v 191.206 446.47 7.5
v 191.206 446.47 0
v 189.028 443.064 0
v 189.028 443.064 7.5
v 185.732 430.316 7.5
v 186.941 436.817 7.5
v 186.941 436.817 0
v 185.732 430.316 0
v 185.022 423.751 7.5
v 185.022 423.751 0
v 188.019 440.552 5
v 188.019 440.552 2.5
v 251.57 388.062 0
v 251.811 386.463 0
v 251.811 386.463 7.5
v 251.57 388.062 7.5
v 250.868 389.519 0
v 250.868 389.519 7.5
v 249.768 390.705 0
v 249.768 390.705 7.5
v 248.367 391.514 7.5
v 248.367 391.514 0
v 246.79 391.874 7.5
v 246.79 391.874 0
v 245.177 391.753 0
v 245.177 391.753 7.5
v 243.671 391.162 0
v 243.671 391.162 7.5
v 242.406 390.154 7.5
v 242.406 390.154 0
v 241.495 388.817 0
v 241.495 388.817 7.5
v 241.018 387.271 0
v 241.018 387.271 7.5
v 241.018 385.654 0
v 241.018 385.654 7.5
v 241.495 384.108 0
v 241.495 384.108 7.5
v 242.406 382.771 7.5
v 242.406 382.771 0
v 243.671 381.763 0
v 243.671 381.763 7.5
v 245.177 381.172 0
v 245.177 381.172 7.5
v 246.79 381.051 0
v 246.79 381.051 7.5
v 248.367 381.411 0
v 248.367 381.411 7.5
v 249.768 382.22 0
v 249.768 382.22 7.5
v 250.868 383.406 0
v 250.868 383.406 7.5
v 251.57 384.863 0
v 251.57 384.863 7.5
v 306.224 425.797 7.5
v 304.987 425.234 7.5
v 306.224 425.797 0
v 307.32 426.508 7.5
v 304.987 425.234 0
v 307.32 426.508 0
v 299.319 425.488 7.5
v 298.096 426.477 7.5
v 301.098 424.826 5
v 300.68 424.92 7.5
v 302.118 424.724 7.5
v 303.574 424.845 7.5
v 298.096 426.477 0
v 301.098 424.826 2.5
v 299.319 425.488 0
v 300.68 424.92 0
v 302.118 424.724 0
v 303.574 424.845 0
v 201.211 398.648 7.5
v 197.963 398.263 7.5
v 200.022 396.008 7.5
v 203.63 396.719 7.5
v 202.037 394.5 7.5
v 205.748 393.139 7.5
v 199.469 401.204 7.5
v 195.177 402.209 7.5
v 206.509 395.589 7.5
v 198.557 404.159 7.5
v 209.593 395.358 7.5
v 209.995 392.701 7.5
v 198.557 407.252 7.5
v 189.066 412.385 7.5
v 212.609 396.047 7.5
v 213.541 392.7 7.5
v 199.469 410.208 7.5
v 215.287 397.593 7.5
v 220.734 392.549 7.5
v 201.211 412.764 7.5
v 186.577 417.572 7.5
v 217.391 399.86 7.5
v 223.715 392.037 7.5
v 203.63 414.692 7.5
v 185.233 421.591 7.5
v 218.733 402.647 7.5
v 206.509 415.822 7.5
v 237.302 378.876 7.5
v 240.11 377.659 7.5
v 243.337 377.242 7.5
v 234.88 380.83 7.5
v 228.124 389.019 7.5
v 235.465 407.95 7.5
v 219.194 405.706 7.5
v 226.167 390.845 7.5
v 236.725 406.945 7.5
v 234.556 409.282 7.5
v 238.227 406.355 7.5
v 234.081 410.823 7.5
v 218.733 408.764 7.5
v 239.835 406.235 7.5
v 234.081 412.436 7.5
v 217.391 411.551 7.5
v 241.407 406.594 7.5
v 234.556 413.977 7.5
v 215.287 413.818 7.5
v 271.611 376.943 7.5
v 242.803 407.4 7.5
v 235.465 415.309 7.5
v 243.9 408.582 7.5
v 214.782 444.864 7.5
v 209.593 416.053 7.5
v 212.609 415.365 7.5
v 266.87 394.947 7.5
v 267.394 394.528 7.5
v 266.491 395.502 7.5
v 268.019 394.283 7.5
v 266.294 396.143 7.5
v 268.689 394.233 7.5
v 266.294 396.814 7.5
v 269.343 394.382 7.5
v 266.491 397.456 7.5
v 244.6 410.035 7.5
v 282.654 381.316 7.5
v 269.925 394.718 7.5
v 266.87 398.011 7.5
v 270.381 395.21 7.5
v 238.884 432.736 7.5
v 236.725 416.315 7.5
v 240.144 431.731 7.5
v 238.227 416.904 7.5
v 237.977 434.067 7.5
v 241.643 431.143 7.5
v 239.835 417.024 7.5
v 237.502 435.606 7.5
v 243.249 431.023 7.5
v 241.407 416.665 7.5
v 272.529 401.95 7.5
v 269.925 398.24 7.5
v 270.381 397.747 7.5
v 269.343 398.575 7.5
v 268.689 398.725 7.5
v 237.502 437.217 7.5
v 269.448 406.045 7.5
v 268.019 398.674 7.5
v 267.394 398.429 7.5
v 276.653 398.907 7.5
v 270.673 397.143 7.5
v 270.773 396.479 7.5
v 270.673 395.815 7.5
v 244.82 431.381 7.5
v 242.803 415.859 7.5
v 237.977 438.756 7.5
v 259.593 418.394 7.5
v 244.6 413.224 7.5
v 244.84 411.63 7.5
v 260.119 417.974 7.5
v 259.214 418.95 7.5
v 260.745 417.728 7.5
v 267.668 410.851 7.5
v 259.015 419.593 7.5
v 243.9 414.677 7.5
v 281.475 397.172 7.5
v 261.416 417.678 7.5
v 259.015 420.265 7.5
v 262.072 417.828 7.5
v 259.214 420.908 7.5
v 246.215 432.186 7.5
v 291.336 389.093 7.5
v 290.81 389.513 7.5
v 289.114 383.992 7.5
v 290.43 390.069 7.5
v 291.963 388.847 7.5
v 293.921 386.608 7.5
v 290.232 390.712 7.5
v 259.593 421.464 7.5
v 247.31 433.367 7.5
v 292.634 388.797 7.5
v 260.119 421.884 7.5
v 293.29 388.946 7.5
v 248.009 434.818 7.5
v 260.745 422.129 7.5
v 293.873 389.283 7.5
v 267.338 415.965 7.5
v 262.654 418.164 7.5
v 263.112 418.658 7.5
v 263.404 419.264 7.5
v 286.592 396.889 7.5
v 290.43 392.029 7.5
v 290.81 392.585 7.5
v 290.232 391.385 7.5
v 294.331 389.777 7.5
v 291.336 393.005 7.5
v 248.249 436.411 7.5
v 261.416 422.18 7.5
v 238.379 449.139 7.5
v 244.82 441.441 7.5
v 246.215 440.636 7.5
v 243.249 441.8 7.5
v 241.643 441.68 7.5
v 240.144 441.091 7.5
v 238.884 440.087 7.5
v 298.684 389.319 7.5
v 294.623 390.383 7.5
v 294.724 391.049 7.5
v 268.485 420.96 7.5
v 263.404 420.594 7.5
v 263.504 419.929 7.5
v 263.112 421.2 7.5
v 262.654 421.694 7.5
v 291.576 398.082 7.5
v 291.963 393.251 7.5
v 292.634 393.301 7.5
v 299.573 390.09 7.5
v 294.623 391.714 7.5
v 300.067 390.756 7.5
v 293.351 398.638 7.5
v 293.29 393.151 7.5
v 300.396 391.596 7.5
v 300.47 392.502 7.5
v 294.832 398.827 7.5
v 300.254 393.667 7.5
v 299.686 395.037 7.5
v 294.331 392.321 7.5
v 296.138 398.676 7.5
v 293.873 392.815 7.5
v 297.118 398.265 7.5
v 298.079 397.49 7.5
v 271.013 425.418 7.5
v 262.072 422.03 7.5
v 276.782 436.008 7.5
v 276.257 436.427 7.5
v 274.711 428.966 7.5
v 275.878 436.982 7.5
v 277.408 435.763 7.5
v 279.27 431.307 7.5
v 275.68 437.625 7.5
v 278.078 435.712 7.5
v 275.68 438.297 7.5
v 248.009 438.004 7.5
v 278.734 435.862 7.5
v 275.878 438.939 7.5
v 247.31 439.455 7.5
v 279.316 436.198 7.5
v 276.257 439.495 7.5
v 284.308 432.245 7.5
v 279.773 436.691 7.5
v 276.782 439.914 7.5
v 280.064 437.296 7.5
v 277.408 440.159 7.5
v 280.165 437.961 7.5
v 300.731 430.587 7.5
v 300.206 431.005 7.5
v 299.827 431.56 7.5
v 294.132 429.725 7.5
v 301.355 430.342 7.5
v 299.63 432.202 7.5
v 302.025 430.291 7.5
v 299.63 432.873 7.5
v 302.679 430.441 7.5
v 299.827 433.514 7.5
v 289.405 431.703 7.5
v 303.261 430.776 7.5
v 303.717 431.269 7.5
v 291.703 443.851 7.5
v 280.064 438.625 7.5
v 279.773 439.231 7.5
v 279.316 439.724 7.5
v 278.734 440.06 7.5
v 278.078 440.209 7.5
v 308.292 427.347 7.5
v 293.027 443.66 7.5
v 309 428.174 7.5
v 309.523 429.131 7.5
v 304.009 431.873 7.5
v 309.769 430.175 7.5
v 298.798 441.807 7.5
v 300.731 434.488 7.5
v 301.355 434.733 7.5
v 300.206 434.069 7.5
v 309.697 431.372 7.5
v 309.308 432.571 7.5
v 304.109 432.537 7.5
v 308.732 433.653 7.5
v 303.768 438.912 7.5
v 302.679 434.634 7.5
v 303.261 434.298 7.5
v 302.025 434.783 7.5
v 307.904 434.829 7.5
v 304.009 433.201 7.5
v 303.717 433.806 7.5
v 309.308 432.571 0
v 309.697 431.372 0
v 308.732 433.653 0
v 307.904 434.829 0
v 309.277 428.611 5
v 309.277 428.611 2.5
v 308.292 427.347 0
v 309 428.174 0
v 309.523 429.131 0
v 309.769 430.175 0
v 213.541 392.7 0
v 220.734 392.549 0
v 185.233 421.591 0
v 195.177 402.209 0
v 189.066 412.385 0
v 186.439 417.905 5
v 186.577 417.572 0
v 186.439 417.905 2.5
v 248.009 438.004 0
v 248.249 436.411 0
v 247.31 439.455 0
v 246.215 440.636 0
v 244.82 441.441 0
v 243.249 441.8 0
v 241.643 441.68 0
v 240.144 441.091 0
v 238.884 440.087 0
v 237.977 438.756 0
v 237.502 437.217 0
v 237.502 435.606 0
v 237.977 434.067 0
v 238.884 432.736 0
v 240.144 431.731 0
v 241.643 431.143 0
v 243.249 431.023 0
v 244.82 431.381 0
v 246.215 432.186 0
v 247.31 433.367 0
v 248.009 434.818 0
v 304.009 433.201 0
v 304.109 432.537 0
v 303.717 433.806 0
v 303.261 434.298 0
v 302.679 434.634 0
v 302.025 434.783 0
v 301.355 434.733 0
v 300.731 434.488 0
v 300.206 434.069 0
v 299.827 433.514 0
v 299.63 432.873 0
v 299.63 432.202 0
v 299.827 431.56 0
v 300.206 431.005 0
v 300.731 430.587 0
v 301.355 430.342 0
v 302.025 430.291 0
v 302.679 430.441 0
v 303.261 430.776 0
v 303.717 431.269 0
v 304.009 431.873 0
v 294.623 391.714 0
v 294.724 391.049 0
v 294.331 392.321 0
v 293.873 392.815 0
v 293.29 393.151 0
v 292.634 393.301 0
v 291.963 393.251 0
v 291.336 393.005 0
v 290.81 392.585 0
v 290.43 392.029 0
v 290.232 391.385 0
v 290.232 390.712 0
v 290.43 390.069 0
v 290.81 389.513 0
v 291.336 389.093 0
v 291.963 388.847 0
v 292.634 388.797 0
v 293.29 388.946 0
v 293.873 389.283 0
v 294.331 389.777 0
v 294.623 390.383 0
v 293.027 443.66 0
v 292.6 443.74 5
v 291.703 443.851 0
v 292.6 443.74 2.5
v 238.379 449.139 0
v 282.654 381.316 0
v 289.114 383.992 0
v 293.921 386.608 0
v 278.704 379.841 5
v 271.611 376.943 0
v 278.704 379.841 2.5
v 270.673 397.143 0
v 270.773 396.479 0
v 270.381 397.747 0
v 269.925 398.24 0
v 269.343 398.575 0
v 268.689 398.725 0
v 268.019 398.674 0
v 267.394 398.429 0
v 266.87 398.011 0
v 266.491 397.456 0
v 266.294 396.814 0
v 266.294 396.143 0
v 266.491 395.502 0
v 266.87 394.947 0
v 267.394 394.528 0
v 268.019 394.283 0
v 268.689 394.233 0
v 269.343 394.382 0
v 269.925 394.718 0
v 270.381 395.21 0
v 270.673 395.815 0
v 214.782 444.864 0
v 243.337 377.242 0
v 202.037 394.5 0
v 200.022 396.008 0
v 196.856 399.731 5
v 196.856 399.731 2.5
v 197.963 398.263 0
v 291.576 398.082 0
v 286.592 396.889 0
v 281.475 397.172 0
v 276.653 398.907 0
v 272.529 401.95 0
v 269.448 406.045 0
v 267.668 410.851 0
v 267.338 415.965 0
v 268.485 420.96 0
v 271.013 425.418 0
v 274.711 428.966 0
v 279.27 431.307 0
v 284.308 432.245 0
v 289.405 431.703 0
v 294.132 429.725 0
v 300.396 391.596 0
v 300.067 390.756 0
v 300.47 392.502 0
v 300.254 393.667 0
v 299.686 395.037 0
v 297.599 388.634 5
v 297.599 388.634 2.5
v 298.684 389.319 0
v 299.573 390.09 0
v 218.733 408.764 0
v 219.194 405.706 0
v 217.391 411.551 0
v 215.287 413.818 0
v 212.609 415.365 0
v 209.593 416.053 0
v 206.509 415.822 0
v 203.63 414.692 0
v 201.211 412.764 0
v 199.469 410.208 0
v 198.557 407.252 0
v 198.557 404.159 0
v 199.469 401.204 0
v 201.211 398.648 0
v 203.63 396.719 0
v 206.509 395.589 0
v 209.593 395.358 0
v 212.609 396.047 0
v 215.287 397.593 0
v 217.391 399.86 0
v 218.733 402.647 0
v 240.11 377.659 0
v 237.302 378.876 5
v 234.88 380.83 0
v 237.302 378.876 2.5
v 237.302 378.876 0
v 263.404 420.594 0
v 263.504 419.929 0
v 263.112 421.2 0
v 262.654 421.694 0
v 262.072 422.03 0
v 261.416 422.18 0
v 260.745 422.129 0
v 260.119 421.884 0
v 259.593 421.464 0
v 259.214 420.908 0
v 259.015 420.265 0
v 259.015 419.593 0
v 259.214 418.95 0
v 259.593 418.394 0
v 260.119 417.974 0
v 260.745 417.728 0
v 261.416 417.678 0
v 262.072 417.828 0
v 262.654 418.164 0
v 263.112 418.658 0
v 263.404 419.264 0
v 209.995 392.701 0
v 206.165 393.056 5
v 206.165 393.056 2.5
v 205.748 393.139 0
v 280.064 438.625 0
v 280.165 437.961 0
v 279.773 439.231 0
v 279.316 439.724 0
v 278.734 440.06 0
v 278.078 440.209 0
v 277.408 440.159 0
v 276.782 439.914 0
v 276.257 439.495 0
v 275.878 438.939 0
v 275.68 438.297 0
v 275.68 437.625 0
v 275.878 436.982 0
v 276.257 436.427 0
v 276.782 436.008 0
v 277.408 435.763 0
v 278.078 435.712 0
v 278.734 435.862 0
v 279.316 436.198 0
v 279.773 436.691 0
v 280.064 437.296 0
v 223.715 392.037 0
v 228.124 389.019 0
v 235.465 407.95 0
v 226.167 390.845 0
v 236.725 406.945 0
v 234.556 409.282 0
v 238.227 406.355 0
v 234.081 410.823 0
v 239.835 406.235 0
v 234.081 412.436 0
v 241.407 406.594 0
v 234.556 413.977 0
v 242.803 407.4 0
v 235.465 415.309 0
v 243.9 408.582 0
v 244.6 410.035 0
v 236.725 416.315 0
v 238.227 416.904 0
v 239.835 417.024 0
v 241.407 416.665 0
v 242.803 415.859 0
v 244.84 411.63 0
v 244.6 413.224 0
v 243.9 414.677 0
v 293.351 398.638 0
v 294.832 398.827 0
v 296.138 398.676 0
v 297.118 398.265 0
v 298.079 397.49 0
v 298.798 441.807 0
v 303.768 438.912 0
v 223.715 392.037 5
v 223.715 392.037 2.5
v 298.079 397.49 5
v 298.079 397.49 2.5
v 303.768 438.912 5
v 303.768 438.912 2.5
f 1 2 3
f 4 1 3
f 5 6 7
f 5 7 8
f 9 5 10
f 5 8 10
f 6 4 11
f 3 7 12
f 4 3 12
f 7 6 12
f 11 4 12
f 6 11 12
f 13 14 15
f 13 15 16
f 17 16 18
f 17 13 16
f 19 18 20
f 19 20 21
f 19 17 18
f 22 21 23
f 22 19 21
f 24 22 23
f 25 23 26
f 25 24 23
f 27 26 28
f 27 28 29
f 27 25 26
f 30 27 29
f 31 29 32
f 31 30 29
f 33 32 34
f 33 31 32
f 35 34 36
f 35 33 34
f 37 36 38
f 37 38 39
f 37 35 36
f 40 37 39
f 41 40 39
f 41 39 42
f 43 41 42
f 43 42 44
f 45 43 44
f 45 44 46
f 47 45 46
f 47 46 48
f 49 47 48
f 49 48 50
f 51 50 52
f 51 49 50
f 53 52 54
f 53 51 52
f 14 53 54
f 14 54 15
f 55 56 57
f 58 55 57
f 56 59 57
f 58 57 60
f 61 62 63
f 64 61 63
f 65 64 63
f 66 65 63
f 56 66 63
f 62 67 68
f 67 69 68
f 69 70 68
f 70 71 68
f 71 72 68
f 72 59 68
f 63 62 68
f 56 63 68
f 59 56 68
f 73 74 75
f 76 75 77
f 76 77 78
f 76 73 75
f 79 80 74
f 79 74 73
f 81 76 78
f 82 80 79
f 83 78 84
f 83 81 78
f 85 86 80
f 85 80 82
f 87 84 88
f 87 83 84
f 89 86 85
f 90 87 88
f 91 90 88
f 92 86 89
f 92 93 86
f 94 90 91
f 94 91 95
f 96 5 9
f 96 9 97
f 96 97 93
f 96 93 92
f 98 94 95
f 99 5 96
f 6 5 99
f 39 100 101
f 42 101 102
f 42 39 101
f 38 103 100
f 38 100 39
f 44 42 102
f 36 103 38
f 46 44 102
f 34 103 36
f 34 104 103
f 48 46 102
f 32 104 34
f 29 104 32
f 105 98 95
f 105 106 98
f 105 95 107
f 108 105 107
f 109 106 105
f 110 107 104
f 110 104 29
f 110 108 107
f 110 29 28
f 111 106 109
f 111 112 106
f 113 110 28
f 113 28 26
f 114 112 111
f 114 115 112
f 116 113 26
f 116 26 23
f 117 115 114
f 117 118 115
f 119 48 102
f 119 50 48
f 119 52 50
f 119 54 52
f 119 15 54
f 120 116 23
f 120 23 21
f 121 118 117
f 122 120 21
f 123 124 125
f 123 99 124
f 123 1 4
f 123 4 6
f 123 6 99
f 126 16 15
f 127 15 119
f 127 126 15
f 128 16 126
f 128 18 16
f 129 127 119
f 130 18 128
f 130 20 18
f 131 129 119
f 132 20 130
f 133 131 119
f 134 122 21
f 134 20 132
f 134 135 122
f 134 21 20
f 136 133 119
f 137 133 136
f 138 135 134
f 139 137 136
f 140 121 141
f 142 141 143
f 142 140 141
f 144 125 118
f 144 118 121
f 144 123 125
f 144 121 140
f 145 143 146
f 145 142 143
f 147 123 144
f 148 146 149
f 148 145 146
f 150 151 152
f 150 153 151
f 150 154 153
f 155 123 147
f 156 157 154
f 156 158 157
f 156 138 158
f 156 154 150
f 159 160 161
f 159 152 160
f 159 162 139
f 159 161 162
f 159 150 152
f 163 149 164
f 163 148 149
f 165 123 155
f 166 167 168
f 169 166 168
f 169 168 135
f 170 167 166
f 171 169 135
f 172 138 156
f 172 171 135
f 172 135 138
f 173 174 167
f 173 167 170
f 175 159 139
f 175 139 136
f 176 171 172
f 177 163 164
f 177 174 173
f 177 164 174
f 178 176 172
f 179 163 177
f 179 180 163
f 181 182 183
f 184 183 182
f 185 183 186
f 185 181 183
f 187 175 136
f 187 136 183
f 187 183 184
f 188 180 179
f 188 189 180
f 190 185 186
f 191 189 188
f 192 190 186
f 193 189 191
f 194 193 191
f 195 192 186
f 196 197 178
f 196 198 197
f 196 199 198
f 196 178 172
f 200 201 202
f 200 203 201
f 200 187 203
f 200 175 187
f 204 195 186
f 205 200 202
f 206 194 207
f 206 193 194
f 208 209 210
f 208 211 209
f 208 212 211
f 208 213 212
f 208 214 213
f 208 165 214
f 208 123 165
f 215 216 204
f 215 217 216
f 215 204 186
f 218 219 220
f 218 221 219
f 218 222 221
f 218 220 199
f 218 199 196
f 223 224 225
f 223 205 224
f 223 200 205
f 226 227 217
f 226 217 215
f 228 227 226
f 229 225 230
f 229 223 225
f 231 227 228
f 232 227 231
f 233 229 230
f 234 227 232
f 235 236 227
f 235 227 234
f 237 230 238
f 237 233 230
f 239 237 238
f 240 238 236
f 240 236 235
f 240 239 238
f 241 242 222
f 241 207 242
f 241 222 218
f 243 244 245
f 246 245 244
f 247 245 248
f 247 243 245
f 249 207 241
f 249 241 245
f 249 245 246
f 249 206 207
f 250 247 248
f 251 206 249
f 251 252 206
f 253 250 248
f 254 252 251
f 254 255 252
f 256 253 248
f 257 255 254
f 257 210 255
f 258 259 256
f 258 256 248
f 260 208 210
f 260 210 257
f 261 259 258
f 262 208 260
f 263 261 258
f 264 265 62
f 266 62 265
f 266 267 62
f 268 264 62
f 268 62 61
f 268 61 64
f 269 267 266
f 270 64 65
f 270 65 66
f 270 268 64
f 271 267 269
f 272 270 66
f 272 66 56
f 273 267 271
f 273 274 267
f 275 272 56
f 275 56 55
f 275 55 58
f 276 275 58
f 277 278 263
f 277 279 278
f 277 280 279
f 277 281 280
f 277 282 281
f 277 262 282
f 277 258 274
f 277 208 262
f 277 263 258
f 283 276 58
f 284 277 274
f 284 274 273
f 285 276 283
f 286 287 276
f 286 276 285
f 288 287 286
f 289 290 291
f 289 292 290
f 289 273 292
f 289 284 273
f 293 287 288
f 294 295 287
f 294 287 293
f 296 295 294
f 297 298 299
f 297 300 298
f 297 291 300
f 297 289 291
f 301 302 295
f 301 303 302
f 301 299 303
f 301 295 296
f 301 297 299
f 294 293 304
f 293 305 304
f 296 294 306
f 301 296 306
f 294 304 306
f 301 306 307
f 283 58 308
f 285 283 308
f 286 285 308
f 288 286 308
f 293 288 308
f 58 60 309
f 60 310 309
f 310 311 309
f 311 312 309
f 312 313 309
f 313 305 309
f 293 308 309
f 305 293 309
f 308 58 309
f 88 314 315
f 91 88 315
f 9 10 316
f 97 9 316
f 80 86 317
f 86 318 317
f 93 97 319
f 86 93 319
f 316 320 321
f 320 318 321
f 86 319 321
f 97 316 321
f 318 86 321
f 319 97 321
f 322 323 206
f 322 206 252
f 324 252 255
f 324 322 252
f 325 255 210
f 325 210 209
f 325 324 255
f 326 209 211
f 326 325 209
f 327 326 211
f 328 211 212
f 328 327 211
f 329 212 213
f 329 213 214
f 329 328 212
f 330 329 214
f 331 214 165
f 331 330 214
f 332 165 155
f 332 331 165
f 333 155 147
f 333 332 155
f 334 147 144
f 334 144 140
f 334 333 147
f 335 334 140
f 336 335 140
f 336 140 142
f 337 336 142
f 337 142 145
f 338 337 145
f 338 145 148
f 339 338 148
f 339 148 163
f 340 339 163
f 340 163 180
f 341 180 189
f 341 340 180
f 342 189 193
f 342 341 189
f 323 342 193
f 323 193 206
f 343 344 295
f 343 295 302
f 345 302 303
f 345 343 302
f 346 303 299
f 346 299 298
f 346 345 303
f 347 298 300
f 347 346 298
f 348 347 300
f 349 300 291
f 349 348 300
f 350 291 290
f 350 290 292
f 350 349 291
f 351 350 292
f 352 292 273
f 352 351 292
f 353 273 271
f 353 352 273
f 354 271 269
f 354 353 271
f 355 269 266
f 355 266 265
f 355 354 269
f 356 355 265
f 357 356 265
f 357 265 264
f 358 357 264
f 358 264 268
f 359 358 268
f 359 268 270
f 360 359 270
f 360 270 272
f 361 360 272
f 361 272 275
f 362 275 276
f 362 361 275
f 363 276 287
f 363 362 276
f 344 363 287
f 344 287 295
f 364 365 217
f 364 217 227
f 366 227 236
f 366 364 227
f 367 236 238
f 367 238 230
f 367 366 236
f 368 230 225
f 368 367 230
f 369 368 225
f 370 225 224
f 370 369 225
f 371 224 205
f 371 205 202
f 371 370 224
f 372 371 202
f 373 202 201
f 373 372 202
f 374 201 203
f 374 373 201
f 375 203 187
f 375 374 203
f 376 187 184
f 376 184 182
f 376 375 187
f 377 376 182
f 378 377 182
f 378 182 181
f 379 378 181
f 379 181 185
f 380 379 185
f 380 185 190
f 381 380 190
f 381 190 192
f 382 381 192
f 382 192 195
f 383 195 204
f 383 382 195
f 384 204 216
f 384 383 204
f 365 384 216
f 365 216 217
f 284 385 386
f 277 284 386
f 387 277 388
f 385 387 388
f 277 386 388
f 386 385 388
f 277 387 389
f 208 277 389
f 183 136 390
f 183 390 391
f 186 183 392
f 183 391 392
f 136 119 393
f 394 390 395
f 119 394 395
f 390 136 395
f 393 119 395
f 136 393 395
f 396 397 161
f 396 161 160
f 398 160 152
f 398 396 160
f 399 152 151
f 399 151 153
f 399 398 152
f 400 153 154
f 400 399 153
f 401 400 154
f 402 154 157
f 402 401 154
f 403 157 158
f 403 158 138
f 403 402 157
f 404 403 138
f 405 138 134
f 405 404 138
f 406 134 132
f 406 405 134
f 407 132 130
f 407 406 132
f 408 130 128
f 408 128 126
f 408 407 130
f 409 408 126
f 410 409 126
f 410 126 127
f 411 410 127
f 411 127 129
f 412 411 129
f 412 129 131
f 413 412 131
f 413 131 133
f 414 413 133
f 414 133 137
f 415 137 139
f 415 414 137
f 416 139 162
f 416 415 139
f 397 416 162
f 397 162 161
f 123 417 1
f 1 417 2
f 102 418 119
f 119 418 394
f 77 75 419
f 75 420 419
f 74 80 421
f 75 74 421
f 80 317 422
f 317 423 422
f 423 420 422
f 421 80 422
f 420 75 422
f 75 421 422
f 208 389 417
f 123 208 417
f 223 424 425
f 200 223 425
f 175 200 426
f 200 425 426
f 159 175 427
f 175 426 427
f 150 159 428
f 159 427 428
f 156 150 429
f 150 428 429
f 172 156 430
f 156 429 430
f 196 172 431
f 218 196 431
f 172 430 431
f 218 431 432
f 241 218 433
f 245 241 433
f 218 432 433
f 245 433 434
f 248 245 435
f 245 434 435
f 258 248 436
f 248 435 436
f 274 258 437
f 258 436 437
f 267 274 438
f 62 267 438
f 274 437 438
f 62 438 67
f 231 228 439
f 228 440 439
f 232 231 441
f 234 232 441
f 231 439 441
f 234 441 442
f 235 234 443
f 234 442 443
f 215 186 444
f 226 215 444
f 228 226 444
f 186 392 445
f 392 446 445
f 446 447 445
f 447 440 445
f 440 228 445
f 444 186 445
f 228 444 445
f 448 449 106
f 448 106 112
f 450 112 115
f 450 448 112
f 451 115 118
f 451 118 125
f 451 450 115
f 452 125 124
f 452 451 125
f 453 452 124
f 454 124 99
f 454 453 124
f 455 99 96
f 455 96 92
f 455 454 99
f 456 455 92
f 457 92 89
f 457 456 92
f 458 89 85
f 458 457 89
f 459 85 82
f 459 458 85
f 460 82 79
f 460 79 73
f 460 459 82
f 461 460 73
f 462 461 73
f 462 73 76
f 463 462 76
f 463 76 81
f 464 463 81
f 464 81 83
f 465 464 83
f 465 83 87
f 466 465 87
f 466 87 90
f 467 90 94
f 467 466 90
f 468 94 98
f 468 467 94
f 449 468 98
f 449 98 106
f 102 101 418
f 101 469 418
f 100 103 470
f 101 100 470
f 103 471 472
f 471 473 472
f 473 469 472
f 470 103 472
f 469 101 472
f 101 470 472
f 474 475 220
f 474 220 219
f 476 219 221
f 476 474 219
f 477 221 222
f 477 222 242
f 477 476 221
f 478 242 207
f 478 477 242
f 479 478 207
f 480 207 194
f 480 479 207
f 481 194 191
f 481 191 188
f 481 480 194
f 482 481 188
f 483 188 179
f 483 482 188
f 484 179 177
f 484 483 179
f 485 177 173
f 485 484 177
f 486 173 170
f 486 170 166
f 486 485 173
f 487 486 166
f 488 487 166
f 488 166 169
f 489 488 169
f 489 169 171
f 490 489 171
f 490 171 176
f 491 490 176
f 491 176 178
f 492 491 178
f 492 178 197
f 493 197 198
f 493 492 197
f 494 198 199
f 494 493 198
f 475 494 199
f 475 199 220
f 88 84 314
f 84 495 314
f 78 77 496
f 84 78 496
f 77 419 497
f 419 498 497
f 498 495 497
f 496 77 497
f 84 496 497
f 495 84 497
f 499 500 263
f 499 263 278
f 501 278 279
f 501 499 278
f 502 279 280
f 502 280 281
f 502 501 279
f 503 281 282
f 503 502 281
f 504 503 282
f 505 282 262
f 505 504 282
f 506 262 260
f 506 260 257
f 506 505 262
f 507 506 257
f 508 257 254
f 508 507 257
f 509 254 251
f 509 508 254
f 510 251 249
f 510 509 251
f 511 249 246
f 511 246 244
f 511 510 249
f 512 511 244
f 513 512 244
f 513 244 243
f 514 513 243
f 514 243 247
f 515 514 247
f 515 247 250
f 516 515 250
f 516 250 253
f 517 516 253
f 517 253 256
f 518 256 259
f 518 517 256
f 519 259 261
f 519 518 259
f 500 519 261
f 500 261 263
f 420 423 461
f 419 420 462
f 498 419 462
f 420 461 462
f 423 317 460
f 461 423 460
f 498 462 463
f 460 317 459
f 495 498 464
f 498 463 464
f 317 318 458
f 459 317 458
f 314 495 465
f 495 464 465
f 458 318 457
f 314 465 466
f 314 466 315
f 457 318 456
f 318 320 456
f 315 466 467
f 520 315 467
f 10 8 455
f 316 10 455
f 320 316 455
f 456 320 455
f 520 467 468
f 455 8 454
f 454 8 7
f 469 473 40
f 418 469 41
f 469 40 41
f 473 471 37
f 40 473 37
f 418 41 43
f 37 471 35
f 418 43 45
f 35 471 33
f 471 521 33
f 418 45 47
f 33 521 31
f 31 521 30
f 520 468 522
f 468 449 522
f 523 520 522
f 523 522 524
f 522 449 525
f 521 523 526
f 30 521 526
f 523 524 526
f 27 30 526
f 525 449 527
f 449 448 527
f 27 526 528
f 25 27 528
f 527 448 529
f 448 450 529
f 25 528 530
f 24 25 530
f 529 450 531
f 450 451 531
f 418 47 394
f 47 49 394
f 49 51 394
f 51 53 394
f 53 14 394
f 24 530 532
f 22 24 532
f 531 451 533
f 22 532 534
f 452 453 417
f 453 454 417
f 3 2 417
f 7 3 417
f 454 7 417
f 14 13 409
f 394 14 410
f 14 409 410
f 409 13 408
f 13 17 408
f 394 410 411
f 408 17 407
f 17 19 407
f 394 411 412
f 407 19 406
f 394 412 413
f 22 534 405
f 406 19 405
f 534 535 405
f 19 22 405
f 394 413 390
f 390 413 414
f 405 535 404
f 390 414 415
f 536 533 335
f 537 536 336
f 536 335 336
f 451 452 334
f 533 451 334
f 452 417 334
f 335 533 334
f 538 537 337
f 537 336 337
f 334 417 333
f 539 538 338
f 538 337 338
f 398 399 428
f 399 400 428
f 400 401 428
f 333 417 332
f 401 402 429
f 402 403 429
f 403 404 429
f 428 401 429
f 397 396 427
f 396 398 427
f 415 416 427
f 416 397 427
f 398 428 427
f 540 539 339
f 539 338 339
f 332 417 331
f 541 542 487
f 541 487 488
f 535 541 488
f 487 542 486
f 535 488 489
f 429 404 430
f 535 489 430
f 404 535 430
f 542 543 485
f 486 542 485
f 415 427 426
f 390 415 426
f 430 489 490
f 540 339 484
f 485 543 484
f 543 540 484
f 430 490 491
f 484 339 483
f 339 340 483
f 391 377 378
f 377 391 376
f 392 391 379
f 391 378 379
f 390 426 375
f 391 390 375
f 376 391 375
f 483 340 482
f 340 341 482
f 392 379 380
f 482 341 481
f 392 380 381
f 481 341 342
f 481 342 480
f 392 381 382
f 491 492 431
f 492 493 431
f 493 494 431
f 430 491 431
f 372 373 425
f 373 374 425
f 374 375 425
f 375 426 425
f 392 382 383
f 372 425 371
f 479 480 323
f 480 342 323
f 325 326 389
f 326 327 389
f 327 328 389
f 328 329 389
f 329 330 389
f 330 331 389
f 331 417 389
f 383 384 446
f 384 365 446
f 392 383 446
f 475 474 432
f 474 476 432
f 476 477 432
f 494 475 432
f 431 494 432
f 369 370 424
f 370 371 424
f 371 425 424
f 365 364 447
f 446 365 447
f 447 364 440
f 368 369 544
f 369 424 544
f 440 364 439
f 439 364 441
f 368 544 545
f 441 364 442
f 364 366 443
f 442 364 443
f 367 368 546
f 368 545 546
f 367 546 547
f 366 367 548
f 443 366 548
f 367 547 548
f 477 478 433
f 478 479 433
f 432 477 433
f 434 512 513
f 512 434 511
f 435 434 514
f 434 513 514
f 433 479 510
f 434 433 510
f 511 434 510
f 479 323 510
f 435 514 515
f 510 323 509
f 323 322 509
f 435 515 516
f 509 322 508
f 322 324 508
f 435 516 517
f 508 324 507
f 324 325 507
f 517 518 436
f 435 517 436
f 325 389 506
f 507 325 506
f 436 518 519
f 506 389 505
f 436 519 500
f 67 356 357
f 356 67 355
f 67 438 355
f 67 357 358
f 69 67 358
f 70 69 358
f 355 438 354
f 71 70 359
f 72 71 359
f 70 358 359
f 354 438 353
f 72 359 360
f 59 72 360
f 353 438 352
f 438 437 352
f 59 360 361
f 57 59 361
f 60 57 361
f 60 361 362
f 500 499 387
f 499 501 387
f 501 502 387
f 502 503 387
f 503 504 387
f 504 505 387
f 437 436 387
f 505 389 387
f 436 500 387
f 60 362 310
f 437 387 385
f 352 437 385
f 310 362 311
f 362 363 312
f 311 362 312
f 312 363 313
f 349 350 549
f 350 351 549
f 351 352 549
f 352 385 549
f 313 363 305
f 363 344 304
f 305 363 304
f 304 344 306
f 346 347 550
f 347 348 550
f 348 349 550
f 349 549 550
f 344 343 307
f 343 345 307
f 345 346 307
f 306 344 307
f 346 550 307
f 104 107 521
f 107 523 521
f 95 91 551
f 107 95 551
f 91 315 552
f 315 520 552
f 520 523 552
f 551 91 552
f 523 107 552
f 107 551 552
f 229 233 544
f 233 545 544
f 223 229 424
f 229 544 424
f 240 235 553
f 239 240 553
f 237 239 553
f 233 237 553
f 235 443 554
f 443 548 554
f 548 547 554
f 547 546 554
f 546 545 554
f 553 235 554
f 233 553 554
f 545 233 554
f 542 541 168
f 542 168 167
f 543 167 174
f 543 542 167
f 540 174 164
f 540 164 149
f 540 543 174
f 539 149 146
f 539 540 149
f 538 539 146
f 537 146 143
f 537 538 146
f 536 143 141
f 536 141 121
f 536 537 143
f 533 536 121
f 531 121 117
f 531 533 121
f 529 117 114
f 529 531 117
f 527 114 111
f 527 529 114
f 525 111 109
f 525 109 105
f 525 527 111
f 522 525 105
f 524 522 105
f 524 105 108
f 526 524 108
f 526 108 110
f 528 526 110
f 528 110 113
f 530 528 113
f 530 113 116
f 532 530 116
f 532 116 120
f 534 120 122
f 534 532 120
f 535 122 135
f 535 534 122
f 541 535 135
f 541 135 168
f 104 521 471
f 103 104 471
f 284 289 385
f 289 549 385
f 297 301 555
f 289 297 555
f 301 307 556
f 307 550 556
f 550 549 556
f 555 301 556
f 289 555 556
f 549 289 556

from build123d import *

# Parameters (mm, degrees)
SKETCH1_R           = 13.83528528
SKETCH1_R_2         = 7.235591107
SKETCH1_R_3         = 3.011320737
SKETCH1_R_4         = 7.213103978
SKETCH1_R_5         = 3.002883417
SKETCH1_R_6         = 3.009410698
SKETCH1_R_7         = 7.205059389
SKETCH1_R_8         = 3.006464833
SKETCH1_R_9         = 3.002887994
BOSS_EXTRUDE3_DEPTH = 10
SCALE6_SCALE        = 0.75


with BuildPart() as part:
    # Sketch1 → Boss-Extrude3 (new body)
    with BuildSketch(Plane.XY):
        with BuildLine():
            add(Edge.make_bspline(
                [(390.702437401, 591.546424948), (390.170237401, 591.665524948), (389.498937401, 591.746824948), (388.937137401, 591.801924948)],
                knots=[0.166666667, 0.166666667, 0.166666667, 0.166666667, 0.208333333, 0.208333333, 0.208333333, 0.208333333], degree=3))
            Line((388.937137401, 591.801924948), (317.8384, 598.8518))
            Line((317.8384, 598.8518), (286.3759, 593.1514))
            Line((286.3759, 593.1514), (254.9413, 595.2929))
            add(Edge.make_bspline(
                [(254.9413, 595.2929), (249.749, 589.6403), (247.5763, 576.1381), (246.6964, 565.0014)],
                knots=[0.333333333, 0.333333333, 0.333333333, 0.333333333, 0.375, 0.375, 0.375, 0.375], degree=3))
            add(Edge.make_bspline(
                [(246.6964, 565.0014), (246.2536, 559.3969), (253.8266, 545.9237), (260.2361, 536.2788)],
                knots=[0.375, 0.375, 0.375, 0.375, 0.416666667, 0.416666667, 0.416666667, 0.416666667], degree=3))
            add(Edge.make_bspline(
                [(260.2361, 536.2788), (261.9315, 533.7276), (265.3965, 528.2241), (269.3831, 526.0001)],
                knots=[0.416666667, 0.416666667, 0.416666667, 0.416666667, 0.458333333, 0.458333333, 0.458333333, 0.458333333], degree=3))
            add(Edge.make_bspline(
                [(269.3831, 526.0001), (274.7125, 523.027), (280.9349, 523.6791), (284.7215, 523.5997)],
                knots=[0.458333333, 0.458333333, 0.458333333, 0.458333333, 0.5, 0.5, 0.5, 0.5], degree=3))
            Line((284.7215, 523.5997), (294.3118, 523.3986))
            add(Edge.make_bspline(
                [(294.3118, 523.3986), (298.656, 523.1896), (301.8697, 521.53), (304.1649, 518.6915)],
                knots=[0.541666667, 0.541666667, 0.541666667, 0.541666667, 0.583333333, 0.583333333, 0.583333333, 0.583333333], degree=3))
            Line((304.1649, 518.6915), (313.1736, 507.7735))
            add(Edge.make_bspline(
                [(313.1736, 507.7735), (316.1604, 504.7059), (319.8516, 502.9821), (324.4499, 502.9891)],
                knots=[0.625, 0.625, 0.625, 0.625, 0.666666667, 0.666666667, 0.666666667, 0.666666667], degree=3))
            Line((324.4499, 502.9891), (362.1482, 502.591))
            add(Edge.make_bspline(
                [(362.1482, 502.591), (370.3987, 506.5747), (383.2456, 509.8601), (391.8953, 515.4769)],
                knots=[0.708333333, 0.708333333, 0.708333333, 0.708333333, 0.75, 0.75, 0.75, 0.75], degree=3))
            add(Edge.make_bspline(
                [(391.8953, 515.4769), (396.6269, 518.5494), (403.2187, 519.6191), (399.5807, 526.7157)],
                knots=[0.75, 0.75, 0.75, 0.75, 0.791666667, 0.791666667, 0.791666667, 0.791666667], degree=3))
            add(Edge.make_bspline(
                [(399.5807, 526.7157), (397.6964, 530.3909), (395.5139, 533.4064), (388.7679, 530.7766)],
                knots=[0.791666667, 0.791666667, 0.791666667, 0.791666667, 0.833333333, 0.833333333, 0.833333333, 0.833333333], degree=3))
            ThreePointArc((388.7679, 530.7766), (356.972685935, 558.005631546), (397.461737401, 568.635424948))
            add(Edge.make_bspline(
                [(397.461737401, 568.635424948), (400.930937401, 564.911724948), (406.485637401, 566.174424948), (409.760237401, 568.677624948)],
                knots=[0.041666667, 0.041666667, 0.041666667, 0.041666667, 0.083333333, 0.083333333, 0.083333333, 0.083333333], degree=3))
            add(Edge.make_bspline(
                [(409.760237401, 568.677624948), (413.064537401, 571.203624948), (414.760537401, 574.392624948), (410.538737401, 579.771624948)],
                knots=[0.083333333, 0.083333333, 0.083333333, 0.083333333, 0.125, 0.125, 0.125, 0.125], degree=3))
            add(Edge.make_bspline(
                [(410.538737401, 579.771624948), (405.594037401, 586.071924948), (398.916537401, 589.707824948), (390.702437401, 591.546424948)],
                knots=[0.125, 0.125, 0.125, 0.125, 0.166666667, 0.166666667, 0.166666667, 0.166666667], degree=3))
        make_face()
        with Locations((278.423738523, 540.940981928)):
            Circle(SKETCH1_R, mode=Mode.SUBTRACT)
        with Locations((328.512486768, 515.283376314)):
            Circle(SKETCH1_R_2, mode=Mode.SUBTRACT)
        with Locations((389.953559171, 521.398342198)):
            Circle(SKETCH1_R_3, mode=Mode.SUBTRACT)
        with Locations((319.240426613, 548.839403542)):
            Circle(SKETCH1_R_4, mode=Mode.SUBTRACT)
        with Locations((358.027351347, 528.638383691)):
            Circle(SKETCH1_R_5, mode=Mode.SUBTRACT)
        with Locations((348.329436617, 559.905288749)):
            Circle(SKETCH1_R_6, mode=Mode.SUBTRACT)
        with Locations((323.793948601, 581.881607046)):
            Circle(SKETCH1_R_7, mode=Mode.SUBTRACT)
        with Locations((370.54631834, 583.947774508)):
            Circle(SKETCH1_R_8, mode=Mode.SUBTRACT)
        with Locations((402.475445199, 576.716414423)):
            Circle(SKETCH1_R_9, mode=Mode.SUBTRACT)
    extrude(amount=BOSS_EXTRUDE3_DEPTH)


with BuildPart() as part_1:
    # Scale6: scaled about (0, 0, 0)
    add(part.part.scale(SCALE6_SCALE))


solid = part_1.part
